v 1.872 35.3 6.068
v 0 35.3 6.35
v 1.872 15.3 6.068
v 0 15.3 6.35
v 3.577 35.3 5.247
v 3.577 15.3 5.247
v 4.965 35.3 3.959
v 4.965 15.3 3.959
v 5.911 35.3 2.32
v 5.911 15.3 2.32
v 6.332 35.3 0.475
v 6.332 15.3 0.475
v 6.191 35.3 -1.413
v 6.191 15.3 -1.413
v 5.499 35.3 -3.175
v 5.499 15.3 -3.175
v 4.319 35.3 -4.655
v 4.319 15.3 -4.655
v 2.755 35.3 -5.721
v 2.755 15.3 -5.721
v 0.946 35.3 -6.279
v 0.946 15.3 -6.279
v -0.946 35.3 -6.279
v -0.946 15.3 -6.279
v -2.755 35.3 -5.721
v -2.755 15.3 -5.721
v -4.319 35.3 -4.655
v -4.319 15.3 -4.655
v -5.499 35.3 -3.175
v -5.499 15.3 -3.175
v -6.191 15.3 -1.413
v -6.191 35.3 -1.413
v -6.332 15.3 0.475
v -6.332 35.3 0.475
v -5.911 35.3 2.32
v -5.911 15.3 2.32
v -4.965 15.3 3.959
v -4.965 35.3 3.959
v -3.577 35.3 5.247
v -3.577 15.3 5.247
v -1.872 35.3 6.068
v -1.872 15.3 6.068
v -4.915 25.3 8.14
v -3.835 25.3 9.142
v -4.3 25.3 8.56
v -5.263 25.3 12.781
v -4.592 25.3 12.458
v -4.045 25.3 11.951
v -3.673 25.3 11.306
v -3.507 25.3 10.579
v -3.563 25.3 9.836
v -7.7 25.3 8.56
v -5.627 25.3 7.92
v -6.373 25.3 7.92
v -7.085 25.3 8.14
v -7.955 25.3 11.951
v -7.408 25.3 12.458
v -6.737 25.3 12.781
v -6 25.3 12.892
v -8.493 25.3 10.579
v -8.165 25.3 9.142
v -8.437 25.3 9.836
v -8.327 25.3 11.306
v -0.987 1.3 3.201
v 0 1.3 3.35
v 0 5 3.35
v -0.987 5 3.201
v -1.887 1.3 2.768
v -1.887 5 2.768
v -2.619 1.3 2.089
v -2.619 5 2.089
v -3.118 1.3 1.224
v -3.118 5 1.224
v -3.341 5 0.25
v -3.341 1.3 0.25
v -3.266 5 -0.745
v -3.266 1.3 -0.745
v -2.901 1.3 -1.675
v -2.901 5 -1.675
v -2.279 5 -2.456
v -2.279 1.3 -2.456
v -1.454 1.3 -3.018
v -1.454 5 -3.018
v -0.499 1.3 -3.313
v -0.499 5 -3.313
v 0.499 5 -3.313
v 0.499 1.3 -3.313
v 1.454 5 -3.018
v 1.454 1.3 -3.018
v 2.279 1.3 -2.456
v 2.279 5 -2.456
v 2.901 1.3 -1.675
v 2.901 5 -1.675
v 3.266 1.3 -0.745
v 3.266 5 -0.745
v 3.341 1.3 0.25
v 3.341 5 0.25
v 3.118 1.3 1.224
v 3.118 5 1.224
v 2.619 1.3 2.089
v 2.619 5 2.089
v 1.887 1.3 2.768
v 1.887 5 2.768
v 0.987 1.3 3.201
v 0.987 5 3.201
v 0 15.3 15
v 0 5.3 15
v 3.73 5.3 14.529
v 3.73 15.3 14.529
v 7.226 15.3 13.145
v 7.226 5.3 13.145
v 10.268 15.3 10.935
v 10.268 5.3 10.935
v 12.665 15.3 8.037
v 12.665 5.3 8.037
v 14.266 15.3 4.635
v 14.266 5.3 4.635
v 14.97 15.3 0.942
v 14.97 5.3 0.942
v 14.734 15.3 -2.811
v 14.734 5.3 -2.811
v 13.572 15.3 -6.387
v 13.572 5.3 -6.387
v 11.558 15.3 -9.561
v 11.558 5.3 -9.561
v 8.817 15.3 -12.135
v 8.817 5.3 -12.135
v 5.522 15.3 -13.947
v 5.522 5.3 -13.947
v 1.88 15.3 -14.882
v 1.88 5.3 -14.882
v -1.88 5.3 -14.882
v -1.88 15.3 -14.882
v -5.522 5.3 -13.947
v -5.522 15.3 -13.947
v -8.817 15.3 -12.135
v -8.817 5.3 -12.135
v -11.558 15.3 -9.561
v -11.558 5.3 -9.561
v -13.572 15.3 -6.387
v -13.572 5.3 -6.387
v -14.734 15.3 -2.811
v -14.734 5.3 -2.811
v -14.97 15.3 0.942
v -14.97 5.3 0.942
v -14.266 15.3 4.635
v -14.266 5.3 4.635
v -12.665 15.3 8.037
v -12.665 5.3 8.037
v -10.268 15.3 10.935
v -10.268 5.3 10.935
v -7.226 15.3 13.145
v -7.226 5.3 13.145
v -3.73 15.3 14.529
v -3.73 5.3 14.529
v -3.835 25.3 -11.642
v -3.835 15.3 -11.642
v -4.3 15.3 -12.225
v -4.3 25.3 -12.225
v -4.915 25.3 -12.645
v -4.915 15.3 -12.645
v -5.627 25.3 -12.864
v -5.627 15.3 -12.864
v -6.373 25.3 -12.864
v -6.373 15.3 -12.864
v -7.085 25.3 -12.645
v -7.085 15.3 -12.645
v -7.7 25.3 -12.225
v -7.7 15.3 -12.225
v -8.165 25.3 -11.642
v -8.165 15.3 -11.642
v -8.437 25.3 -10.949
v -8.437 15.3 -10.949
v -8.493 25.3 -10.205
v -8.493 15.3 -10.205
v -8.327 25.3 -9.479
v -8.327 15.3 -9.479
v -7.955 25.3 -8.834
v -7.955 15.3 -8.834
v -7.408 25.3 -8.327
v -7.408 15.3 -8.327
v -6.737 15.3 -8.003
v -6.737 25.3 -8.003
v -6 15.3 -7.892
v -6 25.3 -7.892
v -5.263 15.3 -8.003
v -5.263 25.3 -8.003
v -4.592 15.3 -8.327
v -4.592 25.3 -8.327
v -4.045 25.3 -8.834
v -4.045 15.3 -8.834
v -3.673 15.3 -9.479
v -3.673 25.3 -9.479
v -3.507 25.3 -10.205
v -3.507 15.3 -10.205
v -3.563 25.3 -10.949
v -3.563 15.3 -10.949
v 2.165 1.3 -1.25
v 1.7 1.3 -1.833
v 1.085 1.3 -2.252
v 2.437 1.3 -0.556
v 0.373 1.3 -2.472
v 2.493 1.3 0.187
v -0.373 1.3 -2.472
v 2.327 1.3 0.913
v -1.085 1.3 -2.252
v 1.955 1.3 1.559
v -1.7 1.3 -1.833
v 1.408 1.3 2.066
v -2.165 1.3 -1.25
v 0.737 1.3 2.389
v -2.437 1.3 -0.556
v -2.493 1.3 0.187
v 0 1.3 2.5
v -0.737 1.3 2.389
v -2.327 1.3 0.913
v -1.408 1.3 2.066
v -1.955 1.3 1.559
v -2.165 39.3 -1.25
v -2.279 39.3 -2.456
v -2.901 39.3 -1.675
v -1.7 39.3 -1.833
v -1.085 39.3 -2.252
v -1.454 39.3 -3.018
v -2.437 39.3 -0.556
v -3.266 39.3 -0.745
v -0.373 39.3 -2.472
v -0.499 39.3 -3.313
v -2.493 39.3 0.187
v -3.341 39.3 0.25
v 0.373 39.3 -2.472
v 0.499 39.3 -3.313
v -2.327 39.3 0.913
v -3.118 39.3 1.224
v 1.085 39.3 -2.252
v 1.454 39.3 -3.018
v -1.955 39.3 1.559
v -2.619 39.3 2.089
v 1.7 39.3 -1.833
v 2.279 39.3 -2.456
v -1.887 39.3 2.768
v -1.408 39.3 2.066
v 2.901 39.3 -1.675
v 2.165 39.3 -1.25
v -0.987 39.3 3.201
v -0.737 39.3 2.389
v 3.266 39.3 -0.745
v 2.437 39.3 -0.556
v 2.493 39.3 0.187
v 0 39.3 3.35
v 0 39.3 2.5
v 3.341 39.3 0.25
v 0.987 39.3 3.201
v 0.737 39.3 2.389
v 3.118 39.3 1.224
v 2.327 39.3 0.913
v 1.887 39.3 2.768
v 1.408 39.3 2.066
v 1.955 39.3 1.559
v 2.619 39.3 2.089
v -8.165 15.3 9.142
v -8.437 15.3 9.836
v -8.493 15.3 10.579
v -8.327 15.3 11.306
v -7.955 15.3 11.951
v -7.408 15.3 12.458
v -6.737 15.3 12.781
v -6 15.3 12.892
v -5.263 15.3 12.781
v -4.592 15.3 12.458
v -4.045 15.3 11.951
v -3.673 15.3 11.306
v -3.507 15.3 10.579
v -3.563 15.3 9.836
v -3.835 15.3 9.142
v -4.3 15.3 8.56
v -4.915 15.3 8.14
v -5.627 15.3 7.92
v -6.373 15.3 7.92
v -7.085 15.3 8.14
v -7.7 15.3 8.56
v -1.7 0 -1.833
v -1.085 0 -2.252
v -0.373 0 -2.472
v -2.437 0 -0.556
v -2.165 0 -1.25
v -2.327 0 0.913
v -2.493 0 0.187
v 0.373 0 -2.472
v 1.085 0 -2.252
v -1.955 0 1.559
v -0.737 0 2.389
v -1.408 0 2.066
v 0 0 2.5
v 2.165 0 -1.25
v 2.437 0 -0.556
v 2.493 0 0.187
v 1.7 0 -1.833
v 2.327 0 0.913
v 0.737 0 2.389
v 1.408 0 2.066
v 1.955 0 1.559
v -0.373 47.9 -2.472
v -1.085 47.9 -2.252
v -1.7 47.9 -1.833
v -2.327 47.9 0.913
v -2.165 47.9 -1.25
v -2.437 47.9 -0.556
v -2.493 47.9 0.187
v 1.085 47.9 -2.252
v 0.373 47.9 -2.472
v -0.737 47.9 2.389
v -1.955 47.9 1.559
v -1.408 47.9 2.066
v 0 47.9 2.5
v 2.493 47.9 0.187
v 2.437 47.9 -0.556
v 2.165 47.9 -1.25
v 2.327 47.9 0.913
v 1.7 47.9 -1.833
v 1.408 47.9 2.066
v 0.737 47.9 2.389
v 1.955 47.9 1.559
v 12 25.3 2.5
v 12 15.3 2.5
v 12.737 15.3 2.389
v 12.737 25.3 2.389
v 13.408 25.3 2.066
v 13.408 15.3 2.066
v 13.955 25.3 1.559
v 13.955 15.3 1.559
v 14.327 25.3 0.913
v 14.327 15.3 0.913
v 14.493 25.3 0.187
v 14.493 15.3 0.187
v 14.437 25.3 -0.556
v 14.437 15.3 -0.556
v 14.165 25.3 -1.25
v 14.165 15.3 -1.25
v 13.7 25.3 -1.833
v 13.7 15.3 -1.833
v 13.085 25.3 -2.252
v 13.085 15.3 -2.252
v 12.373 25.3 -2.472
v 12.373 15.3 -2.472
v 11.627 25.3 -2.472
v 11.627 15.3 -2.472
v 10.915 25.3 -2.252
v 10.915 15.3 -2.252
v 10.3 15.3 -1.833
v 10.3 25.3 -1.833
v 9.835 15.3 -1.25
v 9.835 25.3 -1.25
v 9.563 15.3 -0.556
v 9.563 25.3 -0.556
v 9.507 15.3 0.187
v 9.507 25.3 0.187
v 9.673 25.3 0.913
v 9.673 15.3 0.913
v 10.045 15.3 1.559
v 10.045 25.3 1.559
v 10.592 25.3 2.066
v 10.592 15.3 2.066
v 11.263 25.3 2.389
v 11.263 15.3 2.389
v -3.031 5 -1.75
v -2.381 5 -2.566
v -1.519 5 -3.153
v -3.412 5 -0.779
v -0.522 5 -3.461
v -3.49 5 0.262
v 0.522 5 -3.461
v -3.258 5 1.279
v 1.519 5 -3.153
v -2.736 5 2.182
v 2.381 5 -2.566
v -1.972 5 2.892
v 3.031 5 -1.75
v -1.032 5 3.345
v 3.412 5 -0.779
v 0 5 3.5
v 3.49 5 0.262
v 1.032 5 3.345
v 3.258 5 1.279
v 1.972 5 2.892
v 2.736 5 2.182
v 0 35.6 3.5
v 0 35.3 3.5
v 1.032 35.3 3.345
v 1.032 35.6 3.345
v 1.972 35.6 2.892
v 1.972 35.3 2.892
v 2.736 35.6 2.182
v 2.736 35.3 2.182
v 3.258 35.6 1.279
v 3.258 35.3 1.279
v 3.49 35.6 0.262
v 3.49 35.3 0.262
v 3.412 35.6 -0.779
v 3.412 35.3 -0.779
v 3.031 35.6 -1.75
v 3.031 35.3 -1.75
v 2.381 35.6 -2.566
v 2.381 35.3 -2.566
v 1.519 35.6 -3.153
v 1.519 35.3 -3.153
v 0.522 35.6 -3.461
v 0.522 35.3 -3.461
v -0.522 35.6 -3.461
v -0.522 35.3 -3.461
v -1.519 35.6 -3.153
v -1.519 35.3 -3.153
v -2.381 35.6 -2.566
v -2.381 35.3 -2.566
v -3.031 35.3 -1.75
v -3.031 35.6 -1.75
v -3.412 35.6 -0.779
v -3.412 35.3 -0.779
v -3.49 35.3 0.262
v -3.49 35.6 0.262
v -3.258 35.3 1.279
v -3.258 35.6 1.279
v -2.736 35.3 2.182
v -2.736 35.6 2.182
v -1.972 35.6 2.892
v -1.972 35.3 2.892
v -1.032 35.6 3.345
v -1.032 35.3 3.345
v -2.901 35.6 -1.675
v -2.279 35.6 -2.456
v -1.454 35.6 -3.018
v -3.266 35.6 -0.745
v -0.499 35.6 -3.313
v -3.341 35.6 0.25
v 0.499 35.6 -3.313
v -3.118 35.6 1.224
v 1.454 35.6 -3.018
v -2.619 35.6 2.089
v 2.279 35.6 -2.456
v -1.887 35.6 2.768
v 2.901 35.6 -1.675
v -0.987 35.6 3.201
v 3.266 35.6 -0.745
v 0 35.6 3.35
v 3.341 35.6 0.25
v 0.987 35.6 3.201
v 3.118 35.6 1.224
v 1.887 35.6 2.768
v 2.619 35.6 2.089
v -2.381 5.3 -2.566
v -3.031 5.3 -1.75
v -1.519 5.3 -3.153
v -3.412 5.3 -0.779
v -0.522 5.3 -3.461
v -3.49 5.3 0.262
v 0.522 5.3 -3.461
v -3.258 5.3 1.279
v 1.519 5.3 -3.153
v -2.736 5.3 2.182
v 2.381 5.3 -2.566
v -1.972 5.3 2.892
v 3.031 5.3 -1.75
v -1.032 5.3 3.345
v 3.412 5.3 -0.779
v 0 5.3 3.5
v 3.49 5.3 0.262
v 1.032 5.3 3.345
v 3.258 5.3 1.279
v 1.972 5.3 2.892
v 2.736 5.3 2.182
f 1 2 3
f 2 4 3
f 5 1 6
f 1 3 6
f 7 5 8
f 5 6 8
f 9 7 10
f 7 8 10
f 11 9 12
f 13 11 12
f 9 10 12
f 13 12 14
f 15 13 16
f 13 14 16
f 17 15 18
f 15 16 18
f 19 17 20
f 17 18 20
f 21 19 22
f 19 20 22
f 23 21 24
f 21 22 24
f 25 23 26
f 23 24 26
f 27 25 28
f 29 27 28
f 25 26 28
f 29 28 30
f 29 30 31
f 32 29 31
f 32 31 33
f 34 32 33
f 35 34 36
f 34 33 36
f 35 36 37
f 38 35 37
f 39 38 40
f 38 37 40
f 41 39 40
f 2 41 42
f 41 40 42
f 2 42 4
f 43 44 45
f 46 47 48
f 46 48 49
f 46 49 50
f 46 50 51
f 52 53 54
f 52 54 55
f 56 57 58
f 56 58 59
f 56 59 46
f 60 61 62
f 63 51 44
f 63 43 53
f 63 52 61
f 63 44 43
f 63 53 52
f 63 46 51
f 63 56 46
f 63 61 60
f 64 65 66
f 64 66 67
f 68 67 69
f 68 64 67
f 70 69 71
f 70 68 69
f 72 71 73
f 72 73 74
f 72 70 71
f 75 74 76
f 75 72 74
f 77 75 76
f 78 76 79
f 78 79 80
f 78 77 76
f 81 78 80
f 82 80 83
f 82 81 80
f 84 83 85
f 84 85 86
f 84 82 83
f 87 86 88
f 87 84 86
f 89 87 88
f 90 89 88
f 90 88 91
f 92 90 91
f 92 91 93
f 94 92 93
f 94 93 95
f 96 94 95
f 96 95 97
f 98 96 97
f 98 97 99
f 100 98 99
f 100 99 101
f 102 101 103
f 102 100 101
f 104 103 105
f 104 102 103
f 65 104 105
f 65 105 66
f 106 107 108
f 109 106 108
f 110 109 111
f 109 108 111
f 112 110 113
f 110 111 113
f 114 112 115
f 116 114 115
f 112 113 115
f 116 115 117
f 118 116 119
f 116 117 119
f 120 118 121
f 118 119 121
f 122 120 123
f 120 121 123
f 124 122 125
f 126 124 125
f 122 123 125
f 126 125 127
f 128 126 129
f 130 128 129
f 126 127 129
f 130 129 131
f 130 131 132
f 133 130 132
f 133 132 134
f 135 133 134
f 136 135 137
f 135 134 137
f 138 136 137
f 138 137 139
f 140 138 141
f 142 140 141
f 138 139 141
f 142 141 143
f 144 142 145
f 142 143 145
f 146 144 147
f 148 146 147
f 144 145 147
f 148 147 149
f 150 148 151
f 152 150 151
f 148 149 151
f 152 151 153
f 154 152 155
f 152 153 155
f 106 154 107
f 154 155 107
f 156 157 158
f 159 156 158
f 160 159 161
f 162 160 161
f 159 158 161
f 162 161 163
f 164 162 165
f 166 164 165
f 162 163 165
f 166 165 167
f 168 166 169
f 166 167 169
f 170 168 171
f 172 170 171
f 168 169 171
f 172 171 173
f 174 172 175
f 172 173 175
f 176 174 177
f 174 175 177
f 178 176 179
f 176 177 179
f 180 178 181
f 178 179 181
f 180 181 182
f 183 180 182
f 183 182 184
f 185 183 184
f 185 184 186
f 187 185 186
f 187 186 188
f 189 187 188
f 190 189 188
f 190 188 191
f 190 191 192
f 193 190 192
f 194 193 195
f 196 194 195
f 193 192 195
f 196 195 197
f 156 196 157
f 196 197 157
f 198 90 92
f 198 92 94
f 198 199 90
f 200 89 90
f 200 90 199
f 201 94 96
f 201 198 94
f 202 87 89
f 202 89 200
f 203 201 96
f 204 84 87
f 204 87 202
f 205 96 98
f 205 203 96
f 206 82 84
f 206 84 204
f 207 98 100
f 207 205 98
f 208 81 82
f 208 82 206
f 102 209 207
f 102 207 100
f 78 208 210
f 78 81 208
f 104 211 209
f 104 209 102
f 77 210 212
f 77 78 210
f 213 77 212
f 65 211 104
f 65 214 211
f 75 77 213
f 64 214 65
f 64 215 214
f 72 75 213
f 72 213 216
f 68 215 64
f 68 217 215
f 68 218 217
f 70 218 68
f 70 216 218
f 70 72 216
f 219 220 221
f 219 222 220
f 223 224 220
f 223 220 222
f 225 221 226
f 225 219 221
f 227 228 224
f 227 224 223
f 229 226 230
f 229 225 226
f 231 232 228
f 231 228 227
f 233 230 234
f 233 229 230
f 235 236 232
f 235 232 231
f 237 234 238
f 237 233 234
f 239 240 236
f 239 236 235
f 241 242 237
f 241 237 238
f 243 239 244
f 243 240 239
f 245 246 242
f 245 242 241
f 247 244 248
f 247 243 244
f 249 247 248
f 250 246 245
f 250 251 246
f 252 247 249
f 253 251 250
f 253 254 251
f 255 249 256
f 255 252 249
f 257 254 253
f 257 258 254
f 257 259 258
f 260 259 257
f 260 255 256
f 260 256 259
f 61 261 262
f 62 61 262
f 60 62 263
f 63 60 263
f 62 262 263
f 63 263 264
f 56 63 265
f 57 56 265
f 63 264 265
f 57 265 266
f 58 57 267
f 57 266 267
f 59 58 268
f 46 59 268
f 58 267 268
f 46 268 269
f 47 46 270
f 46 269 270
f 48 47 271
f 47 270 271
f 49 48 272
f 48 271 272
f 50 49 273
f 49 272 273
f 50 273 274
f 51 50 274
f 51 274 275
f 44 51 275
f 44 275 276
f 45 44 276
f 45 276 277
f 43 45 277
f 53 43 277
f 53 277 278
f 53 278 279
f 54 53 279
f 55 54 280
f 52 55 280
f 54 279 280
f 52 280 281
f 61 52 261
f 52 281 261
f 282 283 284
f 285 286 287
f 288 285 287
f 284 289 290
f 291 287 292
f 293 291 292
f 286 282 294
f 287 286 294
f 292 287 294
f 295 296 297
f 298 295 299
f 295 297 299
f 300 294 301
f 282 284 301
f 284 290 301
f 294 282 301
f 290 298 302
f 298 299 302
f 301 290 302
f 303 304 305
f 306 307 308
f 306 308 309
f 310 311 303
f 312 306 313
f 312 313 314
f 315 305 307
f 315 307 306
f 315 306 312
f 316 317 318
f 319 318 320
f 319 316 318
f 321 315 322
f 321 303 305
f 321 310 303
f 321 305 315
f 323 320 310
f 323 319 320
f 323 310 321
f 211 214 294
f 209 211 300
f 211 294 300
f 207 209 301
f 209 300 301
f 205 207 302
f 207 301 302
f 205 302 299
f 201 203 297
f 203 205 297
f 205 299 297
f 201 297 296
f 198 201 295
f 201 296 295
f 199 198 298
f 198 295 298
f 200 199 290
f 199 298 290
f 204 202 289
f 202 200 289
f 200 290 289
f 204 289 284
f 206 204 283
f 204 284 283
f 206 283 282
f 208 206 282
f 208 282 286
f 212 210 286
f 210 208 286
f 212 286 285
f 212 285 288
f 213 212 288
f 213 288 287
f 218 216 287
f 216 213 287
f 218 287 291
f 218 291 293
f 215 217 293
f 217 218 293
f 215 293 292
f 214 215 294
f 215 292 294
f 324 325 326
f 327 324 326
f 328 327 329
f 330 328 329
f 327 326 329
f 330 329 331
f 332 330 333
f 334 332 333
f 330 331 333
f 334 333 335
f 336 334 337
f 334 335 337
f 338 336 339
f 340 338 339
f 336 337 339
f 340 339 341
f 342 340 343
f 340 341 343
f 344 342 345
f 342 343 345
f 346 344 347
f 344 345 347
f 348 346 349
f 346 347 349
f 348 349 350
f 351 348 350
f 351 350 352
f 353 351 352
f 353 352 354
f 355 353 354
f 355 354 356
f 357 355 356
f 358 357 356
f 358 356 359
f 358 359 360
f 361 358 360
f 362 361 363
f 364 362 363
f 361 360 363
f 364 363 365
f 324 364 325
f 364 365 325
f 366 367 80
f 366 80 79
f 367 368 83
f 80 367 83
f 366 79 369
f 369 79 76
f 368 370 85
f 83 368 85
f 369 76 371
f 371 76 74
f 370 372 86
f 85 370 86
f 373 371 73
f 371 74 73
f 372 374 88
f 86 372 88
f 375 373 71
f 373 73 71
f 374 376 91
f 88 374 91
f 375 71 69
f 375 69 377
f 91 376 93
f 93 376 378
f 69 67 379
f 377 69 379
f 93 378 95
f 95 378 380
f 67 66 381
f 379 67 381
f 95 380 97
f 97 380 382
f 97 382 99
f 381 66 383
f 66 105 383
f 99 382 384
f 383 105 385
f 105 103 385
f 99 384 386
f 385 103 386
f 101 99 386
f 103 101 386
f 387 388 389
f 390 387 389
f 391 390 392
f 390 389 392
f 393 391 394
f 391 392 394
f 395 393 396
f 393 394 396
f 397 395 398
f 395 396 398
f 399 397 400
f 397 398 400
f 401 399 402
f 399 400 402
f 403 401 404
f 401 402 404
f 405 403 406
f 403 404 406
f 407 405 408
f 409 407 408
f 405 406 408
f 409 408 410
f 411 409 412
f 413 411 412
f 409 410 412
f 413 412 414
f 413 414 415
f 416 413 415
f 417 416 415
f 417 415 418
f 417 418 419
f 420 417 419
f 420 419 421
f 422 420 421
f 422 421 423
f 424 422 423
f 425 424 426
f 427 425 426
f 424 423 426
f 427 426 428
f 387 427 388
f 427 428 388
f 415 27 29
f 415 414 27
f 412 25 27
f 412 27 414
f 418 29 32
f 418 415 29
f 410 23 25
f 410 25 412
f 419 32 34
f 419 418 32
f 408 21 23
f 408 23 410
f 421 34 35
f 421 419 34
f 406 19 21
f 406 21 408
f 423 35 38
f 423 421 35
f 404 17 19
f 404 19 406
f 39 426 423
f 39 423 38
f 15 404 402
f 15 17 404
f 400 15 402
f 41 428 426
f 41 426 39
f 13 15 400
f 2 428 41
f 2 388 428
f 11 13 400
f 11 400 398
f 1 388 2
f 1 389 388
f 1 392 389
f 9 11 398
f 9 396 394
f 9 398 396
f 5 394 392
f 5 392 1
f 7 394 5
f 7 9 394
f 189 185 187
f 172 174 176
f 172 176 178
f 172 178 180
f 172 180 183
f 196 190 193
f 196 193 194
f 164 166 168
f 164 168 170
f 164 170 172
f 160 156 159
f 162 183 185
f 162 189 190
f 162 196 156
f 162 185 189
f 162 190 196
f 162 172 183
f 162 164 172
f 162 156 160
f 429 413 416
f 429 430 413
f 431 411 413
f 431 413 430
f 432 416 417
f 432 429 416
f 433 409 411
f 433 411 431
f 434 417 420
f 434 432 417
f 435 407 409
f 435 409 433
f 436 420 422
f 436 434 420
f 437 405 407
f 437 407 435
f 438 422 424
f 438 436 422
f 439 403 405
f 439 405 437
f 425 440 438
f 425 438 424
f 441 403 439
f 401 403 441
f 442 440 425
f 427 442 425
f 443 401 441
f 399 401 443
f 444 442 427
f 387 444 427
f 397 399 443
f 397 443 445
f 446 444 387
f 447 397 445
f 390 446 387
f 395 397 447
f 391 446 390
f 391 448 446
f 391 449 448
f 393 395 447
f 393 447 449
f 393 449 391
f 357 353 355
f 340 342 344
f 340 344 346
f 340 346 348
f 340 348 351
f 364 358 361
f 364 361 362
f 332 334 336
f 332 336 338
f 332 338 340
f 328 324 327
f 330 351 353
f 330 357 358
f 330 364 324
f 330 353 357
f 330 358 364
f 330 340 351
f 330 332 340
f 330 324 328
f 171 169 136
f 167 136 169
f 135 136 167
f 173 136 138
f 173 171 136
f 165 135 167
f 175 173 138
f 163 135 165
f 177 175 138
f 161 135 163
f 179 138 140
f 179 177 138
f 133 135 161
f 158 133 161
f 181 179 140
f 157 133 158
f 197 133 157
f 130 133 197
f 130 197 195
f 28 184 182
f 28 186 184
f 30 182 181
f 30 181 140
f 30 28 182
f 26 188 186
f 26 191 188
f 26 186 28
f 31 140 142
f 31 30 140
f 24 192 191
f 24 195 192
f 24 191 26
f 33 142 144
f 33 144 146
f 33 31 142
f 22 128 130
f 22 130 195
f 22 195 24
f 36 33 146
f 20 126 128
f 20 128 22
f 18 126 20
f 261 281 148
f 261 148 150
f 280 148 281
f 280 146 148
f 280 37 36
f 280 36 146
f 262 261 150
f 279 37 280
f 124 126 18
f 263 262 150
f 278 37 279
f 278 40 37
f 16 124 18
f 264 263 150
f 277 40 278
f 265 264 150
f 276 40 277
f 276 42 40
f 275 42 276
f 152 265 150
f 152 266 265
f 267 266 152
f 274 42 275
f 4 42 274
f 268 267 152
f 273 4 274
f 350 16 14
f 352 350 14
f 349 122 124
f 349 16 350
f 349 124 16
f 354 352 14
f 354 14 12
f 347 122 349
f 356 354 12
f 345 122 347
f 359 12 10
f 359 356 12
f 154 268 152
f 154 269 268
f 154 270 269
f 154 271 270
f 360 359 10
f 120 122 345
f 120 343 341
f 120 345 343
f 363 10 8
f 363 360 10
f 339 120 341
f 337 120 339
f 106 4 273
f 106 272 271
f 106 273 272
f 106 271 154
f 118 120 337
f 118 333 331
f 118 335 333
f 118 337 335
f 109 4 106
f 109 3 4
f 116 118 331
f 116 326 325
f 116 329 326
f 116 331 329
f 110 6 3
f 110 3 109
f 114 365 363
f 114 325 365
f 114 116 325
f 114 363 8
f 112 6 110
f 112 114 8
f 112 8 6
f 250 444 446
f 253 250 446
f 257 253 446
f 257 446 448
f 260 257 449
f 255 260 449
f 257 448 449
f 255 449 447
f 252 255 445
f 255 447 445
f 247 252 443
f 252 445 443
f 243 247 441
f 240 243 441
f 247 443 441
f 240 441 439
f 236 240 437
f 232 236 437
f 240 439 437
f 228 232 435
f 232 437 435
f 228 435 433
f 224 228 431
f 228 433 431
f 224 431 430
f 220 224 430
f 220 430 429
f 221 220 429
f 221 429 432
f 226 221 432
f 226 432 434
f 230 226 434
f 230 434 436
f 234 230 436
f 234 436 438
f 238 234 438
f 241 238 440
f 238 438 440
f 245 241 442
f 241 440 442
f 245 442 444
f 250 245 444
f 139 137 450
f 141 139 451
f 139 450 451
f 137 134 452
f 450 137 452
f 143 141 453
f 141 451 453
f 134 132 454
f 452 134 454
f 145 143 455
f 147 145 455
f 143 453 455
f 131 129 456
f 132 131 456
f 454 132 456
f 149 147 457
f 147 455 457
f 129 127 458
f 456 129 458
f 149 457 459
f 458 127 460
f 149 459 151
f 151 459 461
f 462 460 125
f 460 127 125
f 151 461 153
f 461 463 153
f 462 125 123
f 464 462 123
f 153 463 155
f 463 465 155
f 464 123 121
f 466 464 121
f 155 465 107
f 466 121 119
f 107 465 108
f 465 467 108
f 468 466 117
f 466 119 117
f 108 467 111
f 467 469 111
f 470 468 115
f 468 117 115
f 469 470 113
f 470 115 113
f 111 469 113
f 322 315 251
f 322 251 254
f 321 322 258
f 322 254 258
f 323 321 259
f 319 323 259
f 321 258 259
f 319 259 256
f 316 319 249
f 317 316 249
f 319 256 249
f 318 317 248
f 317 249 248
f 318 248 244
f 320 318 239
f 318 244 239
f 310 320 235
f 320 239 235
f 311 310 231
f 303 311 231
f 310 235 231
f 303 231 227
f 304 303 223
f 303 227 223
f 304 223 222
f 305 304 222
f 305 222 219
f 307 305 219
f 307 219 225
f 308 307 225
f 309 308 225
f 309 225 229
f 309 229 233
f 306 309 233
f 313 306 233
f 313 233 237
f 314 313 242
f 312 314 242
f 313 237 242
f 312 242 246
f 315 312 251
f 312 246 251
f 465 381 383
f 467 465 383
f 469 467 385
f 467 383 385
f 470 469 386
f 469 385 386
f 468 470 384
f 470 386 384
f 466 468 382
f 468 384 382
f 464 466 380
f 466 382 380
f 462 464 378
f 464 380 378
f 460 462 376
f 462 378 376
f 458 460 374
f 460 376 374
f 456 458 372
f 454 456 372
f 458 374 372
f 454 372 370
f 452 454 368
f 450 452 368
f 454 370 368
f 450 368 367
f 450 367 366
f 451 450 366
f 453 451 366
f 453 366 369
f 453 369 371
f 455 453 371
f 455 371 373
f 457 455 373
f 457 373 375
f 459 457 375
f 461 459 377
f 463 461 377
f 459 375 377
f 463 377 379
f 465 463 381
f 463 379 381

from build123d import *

# Parameters (mm, degrees)
SKETCH_1_R               = 2.5
EXTRUDE_1_DEPTH          = 5
SKETCH_2_R               = 3.5
EXTRUDE_2_DEPTH          = 0.3
SKETCH_3_R               = 15
EXTRUDE_3_DEPTH          = 10
SKETCH_4_R               = 6.35
EXTRUDE_4_DEPTH          = 10
SKETCH_5_R               = 6.35
EXTRUDE_5_DEPTH          = 10
SKETCH_6_R               = 3.5
EXTRUDE_6_DEPTH          = 0.3
SKETCH_7_R               = 3.35
EXTRUDE_7_DEPTH          = 3.7
SKETCH_8_R               = 2.5
EXTRUDE_8_DEPTH          = 3
EXTRUDE_START            = 3.7
SKETCH_9_R               = 3.35
EXTRUDE_9_DEPTH          = 3.7
SKETCH_10_R              = 2.5
EXTRUDE_10_DEPTH         = 5.6
SKETCH_11_R              = 2.5
EXTRUDE_11_DEPTH         = 10
PATTERN_CIRCULAR_1_COUNT = 3


with BuildPart() as part:
    # 草图1 → 凸台-拉伸1 (new body)
    with BuildSketch(Plane(origin=(0, 0, 0), x_dir=(1, 0, 0), z_dir=(0, 1, 0))):
        with Locations(Location((0, 0, 0), (0, 0, 270))):
            Circle(SKETCH_1_R)
    extrude(amount=EXTRUDE_1_DEPTH)

    # 草图2 → 凸台-拉伸2 (add)
    with BuildSketch(Plane(origin=(0, 5, 0), x_dir=(1, 0, 0), z_dir=(0, 1, 0))):
        with Locations(Location((0, 0, 0), (0, 0, 270))):
            Circle(SKETCH_2_R)
    extrude(amount=EXTRUDE_2_DEPTH)

    # 草图3 → 凸台-拉伸3 (add)
    with BuildSketch(Plane(origin=(0, 5.3, 0), x_dir=(1, 0, 0), z_dir=(0, 1, 0))):
        with Locations(Location((0, 0, 0), (0, 0, 270))):
            Circle(SKETCH_3_R)
    extrude(amount=EXTRUDE_3_DEPTH)

    # 草图4 → 凸台-拉伸4 (add)
    with BuildSketch(Plane(origin=(0, 15.3, 0), x_dir=(1, 0, 0), z_dir=(0, 1, 0))):
        with Locations(Location((0, 0, 0), (0, 0, 270))):
            Circle(SKETCH_4_R)
    extrude(amount=EXTRUDE_4_DEPTH)

    # 草图5 → 凸台-拉伸5 (add)
    with BuildSketch(Plane(origin=(0, 25.3, 0), x_dir=(1, 0, 0), z_dir=(0, 1, 0))):
        with Locations(Location((0, 0, 0), (0, 0, 270))):
            Circle(SKETCH_5_R)
    extrude(amount=EXTRUDE_5_DEPTH)

    # 草图6 → 凸台-拉伸6 (add)
    with BuildSketch(Plane(origin=(0, 35.3, 0), x_dir=(1, 0, 0), z_dir=(0, 1, 0))):
        with Locations(Location((0, 0, 0), (0, 0, 270))):
            Circle(SKETCH_6_R)
    extrude(amount=EXTRUDE_6_DEPTH)

    # 草图7 → 凸台-拉伸7 (add)
    with BuildSketch(Plane(origin=(0, 35.6, 0), x_dir=(1, 0, 0), z_dir=(0, 1, 0))):
        with Locations(Location((0, 0, 0), (0, 0, 270))):
            Circle(SKETCH_7_R)
    extrude(amount=EXTRUDE_7_DEPTH)

    # 草图8 → 凸台-拉伸8 (add)
    with BuildSketch(Plane(origin=(0, 39.3, 0), x_dir=(1, 0, 0), z_dir=(0, 1, 0))):
        with Locations(Location((0, 0, 0), (0, 0, 270))):
            Circle(SKETCH_8_R)
    extrude(amount=EXTRUDE_8_DEPTH)

    # 草图9 → 凸台-拉伸9 (add)
    with BuildSketch(Plane(origin=(0, 5, 0), x_dir=(-1, 0, 0), z_dir=(0, -1, 0)).offset(EXTRUDE_START)):
        with Locations(Location((0, 0, 0), (0, 0, 270))):
            Circle(SKETCH_9_R)
    extrude(amount=-EXTRUDE_9_DEPTH)

    # 草图10 → 凸台-拉伸10 (add)
    with BuildSketch(Plane(origin=(0, 42.3, 0), x_dir=(1, 0, 0), z_dir=(0, 1, 0))):
        with Locations(Location((0, 0, 0), (0, 0, 270))):
            Circle(SKETCH_10_R)
    extrude(amount=EXTRUDE_10_DEPTH)

    # 草图11 → 凸台-拉伸11 (add)
    with BuildSketch(Plane(origin=(0, 15.3, 0), x_dir=(1, 0, 0), z_dir=(0, 1, 0))):
        with Locations(Location((12, 0, 0), (0, 0, 270))):
            Circle(SKETCH_11_R)
    extrude_11 = extrude(amount=EXTRUDE_11_DEPTH)

    # 阵列(圆周)1: 凸台-拉伸11 ×3 about axis
    pattern_circular_1_axis = Axis((0, 0, 0), (0, 1, 0))
    for i in range(1, PATTERN_CIRCULAR_1_COUNT):
        add(extrude_11.rotate(pattern_circular_1_axis, i * 360 / PATTERN_CIRCULAR_1_COUNT))


solid = part.part
